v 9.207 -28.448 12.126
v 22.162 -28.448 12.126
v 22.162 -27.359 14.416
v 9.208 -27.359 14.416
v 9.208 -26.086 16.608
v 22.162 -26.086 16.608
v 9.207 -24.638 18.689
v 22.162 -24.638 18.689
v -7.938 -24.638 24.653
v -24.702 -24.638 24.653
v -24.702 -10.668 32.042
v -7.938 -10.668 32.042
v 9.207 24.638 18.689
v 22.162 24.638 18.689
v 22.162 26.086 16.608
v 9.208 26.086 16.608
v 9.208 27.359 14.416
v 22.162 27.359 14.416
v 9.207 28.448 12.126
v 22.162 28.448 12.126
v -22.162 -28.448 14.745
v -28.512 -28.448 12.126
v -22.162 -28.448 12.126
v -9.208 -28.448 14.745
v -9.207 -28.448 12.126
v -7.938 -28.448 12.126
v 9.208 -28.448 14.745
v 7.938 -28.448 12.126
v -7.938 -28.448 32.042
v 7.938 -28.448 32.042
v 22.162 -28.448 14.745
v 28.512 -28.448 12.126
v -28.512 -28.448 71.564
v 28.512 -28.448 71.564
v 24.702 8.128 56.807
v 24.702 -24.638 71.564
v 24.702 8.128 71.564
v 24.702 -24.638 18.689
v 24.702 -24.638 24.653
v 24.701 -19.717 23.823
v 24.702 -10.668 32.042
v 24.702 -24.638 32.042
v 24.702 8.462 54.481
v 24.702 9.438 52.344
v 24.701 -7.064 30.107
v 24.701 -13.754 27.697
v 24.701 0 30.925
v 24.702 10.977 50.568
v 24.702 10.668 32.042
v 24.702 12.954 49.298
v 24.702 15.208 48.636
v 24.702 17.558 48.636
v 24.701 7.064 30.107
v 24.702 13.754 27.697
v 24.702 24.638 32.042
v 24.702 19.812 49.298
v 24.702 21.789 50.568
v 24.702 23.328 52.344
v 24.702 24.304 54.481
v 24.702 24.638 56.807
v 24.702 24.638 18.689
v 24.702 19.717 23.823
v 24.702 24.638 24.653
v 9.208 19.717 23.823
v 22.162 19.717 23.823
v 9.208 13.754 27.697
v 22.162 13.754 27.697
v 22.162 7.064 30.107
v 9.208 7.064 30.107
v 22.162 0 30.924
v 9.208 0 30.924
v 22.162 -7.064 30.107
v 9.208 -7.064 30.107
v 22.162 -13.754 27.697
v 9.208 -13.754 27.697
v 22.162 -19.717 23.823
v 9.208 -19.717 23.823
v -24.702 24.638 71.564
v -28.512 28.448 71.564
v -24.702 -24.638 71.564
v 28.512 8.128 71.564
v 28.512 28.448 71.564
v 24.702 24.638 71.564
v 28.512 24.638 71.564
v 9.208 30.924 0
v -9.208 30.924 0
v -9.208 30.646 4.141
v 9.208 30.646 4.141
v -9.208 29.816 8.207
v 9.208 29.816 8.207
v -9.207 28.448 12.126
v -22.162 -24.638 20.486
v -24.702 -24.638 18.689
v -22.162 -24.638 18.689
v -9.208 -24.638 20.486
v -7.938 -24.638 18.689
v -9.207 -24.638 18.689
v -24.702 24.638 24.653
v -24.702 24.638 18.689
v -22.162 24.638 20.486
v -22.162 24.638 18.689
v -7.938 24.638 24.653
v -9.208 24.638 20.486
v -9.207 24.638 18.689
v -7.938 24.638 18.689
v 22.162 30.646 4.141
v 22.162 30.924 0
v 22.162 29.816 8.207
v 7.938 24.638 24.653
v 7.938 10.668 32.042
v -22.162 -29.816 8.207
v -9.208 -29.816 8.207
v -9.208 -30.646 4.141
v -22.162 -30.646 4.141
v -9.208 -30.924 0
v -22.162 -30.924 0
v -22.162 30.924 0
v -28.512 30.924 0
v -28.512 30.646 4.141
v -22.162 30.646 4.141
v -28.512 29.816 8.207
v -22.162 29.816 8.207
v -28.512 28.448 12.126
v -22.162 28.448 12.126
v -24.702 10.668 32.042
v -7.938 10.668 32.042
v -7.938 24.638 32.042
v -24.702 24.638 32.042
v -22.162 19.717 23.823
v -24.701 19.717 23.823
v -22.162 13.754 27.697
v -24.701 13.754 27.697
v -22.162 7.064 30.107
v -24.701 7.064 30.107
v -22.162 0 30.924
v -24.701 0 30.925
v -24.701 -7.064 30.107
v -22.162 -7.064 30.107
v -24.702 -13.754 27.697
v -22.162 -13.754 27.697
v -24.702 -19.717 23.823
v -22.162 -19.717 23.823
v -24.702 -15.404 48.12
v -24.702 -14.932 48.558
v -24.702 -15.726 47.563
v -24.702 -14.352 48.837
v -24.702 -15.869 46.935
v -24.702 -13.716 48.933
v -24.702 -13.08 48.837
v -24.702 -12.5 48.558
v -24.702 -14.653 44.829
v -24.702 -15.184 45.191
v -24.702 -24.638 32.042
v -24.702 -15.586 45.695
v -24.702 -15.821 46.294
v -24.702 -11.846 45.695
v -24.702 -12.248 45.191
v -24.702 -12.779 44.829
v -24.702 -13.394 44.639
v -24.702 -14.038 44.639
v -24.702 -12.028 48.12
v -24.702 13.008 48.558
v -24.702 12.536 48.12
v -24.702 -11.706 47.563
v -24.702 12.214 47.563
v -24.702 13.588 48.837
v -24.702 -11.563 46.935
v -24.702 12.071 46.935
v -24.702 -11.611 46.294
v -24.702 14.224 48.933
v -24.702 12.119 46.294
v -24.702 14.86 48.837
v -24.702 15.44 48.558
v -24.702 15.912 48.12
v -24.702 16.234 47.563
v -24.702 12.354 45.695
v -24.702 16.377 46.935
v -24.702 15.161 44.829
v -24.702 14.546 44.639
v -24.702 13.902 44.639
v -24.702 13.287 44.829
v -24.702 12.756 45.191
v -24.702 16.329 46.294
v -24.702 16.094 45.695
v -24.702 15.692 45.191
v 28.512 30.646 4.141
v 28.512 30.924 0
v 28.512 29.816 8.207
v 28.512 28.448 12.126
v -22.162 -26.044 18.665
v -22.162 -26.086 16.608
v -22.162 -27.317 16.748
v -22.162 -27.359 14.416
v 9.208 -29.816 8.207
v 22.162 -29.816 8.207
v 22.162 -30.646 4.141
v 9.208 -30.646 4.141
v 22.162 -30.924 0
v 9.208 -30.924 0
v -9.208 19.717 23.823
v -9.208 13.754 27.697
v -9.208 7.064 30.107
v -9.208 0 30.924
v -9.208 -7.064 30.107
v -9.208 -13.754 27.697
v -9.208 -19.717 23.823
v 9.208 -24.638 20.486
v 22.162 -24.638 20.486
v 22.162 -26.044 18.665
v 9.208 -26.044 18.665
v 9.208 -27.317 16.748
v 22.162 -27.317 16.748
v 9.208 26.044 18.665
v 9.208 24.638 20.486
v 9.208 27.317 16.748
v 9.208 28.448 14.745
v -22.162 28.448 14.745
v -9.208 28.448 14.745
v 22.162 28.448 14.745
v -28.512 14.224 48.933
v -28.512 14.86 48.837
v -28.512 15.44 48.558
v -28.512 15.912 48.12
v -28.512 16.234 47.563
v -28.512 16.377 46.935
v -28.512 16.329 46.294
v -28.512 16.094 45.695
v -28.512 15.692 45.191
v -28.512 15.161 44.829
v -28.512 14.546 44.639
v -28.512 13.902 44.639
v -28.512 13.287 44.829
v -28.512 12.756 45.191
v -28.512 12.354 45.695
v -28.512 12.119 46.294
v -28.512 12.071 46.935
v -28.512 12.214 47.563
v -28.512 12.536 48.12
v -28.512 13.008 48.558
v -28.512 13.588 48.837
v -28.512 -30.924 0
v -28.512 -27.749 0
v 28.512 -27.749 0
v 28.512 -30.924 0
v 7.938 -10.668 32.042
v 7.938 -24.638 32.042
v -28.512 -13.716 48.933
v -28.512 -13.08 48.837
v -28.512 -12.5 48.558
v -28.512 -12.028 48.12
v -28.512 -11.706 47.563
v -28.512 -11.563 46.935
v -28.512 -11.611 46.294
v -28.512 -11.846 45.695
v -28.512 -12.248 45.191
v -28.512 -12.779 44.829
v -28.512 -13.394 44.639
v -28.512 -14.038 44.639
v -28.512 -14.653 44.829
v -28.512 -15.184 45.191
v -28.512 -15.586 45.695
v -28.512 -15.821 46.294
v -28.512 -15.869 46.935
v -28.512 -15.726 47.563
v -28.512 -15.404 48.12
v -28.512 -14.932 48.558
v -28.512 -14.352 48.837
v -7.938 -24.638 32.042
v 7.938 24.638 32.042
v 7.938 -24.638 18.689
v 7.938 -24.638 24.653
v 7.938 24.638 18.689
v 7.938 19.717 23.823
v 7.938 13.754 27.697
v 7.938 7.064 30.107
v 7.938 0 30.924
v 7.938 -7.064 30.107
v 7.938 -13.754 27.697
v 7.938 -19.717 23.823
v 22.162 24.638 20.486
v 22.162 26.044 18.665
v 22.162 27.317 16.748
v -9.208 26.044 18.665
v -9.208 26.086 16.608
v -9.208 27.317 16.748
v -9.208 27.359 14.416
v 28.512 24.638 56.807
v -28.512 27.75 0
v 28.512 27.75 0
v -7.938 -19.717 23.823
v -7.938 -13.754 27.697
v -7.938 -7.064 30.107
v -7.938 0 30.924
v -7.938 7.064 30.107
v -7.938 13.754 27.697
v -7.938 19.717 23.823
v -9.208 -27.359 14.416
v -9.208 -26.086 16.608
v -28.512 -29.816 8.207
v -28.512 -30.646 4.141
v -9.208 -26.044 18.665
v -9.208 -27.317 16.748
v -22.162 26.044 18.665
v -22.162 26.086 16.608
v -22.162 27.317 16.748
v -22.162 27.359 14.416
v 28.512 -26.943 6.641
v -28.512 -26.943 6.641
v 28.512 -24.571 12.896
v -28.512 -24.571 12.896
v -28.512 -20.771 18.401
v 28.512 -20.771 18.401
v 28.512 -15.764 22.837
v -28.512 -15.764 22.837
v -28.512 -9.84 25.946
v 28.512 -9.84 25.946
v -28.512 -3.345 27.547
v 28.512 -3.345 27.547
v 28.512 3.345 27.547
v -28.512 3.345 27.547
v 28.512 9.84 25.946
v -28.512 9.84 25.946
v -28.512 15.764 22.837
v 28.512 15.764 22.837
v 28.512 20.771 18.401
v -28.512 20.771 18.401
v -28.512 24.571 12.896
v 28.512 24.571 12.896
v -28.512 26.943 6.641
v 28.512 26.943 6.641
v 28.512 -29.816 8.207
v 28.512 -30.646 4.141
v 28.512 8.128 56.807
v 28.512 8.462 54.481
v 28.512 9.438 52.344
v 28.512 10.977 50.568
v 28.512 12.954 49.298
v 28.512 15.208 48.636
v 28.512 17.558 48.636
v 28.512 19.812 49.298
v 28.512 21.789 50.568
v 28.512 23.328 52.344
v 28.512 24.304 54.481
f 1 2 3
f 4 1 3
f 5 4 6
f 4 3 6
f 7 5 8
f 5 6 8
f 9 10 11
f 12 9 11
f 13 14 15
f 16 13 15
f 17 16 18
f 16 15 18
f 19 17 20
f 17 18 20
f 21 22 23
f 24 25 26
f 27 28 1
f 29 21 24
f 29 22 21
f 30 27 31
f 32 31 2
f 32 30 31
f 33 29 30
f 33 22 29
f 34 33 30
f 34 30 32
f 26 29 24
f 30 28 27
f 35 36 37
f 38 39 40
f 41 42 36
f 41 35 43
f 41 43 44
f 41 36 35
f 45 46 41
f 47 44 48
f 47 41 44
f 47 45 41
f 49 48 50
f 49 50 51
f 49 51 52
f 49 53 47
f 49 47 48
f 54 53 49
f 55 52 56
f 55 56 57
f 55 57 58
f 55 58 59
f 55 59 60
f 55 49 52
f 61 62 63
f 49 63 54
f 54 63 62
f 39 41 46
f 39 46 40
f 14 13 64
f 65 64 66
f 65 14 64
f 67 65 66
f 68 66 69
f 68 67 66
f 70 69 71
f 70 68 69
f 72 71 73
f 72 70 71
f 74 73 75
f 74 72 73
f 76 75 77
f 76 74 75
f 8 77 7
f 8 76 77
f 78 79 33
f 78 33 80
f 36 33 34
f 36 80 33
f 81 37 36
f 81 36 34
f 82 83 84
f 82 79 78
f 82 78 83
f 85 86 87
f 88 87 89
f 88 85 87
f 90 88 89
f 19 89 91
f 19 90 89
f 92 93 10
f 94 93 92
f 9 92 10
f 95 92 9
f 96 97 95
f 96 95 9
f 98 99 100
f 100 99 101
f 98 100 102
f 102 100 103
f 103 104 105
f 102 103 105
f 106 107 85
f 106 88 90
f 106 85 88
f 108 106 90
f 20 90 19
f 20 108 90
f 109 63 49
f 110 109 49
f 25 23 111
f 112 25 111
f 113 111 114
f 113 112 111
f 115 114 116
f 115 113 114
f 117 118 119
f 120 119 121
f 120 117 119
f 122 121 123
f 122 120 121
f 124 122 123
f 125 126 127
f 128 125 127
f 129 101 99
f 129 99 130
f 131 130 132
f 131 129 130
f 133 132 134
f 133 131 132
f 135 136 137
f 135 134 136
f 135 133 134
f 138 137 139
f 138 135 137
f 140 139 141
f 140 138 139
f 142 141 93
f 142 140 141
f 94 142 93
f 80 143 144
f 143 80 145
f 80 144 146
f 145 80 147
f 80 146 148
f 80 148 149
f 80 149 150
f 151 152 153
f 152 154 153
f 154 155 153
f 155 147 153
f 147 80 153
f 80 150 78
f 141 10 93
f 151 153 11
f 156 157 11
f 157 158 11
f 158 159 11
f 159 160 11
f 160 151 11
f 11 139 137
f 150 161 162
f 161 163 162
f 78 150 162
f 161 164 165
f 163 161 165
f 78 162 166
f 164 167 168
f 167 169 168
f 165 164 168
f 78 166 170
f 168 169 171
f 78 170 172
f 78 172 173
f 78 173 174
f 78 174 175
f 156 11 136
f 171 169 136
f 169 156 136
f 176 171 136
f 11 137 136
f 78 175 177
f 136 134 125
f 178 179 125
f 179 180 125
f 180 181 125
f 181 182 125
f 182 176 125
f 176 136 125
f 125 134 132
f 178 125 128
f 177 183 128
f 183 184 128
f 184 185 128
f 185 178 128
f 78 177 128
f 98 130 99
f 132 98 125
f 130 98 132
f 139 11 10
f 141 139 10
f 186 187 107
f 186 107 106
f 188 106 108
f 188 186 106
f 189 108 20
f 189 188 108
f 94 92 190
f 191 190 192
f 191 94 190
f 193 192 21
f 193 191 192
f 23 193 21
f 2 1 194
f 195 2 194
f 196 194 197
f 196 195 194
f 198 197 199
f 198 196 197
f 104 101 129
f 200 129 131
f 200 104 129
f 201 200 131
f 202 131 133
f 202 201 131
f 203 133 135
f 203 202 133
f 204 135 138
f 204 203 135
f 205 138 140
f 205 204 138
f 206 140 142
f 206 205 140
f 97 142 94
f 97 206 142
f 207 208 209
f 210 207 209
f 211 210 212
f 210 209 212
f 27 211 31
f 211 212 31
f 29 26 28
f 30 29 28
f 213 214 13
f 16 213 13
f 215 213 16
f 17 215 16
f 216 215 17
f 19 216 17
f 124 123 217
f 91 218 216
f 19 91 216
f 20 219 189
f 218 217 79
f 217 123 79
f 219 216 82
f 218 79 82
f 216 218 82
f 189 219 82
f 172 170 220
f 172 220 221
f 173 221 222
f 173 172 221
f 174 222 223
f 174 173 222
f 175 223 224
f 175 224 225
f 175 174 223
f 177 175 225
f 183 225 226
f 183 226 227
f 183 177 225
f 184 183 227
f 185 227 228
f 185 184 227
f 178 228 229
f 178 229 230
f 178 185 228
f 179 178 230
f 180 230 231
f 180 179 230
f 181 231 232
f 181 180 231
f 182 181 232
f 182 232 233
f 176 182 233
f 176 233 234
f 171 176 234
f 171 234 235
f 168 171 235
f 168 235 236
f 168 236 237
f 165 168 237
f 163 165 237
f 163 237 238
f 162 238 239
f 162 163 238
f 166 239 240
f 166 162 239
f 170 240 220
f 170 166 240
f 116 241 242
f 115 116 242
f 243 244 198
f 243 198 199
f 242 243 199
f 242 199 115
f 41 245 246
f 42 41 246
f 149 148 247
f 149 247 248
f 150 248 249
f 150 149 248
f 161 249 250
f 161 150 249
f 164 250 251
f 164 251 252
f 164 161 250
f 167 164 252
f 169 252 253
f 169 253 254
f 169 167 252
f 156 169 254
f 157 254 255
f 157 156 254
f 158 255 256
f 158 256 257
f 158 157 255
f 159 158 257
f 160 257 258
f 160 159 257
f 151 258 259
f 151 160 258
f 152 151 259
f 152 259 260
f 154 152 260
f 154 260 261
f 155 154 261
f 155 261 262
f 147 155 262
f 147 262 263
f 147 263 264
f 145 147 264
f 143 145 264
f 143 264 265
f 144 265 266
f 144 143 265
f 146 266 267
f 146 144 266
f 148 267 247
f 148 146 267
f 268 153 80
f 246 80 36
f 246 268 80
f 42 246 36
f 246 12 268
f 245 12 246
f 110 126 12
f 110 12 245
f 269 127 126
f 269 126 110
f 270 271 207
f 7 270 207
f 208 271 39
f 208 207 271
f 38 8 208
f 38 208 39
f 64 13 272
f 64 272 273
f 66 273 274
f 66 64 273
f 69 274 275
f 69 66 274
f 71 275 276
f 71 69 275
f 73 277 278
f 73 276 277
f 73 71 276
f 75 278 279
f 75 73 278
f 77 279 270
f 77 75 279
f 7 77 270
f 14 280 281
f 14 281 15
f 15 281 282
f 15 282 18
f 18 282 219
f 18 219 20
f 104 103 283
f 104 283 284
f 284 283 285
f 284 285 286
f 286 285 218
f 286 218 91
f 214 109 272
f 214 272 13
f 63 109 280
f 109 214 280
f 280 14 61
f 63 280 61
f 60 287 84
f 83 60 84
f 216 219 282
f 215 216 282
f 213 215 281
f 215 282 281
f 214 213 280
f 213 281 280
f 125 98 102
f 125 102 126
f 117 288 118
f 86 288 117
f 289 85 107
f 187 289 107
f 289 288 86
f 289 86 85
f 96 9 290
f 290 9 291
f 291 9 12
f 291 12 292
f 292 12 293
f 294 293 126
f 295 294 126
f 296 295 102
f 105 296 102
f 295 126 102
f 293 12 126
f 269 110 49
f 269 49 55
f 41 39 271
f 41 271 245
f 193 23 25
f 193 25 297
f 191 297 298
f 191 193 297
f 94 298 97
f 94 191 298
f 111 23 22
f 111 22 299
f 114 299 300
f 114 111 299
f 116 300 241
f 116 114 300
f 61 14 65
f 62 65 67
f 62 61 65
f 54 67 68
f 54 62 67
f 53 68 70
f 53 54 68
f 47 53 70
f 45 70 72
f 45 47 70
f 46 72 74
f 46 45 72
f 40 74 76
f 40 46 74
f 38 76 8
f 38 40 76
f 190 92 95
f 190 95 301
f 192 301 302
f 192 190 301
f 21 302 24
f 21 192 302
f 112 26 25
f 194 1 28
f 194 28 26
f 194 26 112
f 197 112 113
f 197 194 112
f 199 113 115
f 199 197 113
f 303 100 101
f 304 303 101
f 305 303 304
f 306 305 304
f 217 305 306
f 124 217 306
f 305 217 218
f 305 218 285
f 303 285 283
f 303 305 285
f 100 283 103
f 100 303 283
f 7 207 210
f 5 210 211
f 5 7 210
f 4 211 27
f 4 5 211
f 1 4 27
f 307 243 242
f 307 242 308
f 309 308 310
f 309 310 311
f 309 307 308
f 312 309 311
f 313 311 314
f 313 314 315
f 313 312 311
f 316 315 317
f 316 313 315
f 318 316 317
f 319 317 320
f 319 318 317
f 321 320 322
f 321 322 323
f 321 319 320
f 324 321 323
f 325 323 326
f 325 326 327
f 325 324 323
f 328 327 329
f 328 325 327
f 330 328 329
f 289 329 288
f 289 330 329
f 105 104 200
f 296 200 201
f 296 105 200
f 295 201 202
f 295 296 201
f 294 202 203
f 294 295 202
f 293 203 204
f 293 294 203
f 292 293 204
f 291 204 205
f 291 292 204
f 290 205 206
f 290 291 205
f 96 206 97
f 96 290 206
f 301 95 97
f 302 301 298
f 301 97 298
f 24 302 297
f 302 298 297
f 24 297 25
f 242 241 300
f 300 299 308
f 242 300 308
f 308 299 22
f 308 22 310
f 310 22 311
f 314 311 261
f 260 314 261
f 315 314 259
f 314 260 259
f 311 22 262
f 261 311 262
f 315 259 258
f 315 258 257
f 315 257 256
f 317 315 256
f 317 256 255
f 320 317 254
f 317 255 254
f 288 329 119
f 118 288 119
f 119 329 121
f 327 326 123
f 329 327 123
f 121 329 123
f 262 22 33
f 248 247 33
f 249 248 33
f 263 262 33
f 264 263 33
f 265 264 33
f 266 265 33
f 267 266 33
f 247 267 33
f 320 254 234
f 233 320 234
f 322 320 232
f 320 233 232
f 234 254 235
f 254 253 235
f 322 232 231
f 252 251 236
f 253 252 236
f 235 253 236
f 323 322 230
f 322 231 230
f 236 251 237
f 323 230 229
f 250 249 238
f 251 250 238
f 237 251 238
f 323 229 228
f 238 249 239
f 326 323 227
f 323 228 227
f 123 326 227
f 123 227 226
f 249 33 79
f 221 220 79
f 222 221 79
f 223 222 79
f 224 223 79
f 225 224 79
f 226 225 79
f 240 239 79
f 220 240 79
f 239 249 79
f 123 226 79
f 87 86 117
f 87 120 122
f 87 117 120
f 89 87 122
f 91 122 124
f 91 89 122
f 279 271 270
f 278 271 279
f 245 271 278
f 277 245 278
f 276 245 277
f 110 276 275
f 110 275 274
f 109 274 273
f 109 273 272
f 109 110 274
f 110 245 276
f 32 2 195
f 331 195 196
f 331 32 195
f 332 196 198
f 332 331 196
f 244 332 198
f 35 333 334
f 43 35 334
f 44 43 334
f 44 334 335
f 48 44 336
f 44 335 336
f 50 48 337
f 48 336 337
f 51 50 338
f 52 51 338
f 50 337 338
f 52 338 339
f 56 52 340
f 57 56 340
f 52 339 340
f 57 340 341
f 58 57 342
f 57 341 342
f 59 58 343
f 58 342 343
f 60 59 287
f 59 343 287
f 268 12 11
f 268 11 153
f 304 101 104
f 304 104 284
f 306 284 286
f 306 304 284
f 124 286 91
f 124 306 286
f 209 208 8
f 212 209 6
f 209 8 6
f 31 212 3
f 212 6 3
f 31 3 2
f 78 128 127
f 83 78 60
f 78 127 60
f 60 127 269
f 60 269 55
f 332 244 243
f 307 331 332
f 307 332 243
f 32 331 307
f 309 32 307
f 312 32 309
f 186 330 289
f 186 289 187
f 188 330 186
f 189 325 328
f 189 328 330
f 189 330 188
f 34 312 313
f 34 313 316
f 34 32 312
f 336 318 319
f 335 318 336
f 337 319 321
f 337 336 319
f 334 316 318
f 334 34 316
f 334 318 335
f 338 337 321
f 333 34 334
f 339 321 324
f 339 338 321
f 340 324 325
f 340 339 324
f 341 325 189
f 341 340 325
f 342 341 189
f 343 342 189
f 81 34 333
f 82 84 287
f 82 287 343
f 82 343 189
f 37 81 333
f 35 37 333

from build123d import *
from build123d.topology import SkipClean

# Parameters (mm, degrees)
BOSS_EXTRUDE1_DEPTH                  = 28.5115
SKETCH5_W                            = 57.023
SKETCH5_H                            = 56.896
SKETCH5_W_2                          = 49.403
SKETCH5_H_2                          = 49.276
BOSS_EXTRUDE2_DEPTH                  = 40.64
BOSS_EXTRUDE2_DIRECTION_2_REACH      = 54.207
BOSS_EXTRUDE2_DIRECTION_2_END_RADIUS = 30.9245
CUT_EXTRUDE1_START                   = -12.954
CUT_EXTRUDE1_DEPTH                   = 12.954
CUT_EXTRUDE2_START                   = -12.954
CUT_EXTRUDE2_DEPTH                   = 12.954
CUT_EXTRUDE3_DEPTH                   = 3.81
BOSS_EXTRUDE3_REACH                  = 59.717
BOSS_EXTRUDE3_END_RADIUS             = 30.9245
SKETCH11_W                           = 15.875
SKETCH11_H                           = 53.086
BOSS_EXTRUDE5_DEPTH                  = 16.764
BOSS_EXTRUDE6_DEPTH                  = 16.764
CUT_EXTRUDE4_START                   = -3.81
CUT_EXTRUDE4_OUTLINE_R               = 2.159
CUT_EXTRUDE4_DEPTH                   = 3.81


# Read off the part's stored shape, not the designer's step: Cut-Extrude4
with BuildPart() as part:
    # Sketch2 → Boss-Extrude1 (new, symmetric)
    with BuildSketch(Plane(origin=(0, 0, 0), x_dir=(0, 0, -1), z_dir=(1, 0, 0))):
        with BuildLine():
            Line((0, -30.9245), (0, -27.7495))
            ThreePointArc((0, -27.7495), (-27.7495, 0), (0, 27.7495))
            Line((0, 27.7495), (0, 30.9245))
            ThreePointArc((0, 30.9245), (-30.9245, 0), (0, -30.9245))
        make_face()
    extrude(amount=BOSS_EXTRUDE1_DEPTH, both=True)

    # Sketch5 → Boss-Extrude2 (add)
    with BuildSketch(Plane.XY.offset(30.9245)):
        Rectangle(SKETCH5_W, SKETCH5_H)
        Rectangle(SKETCH5_W_2, SKETCH5_H_2, mode=Mode.SUBTRACT)
    extrude(amount=BOSS_EXTRUDE2_DEPTH)

    # Boss-Extrude2 direction 2: up to this cylinder (the profile starts outside it)
    boss_extrude2_direction_2_end = Plane(origin=(0, 0, 0), z_dir=(-1, 0, 0)) * Cylinder(BOSS_EXTRUDE2_DIRECTION_2_END_RADIUS, 171.263, mode=Mode.PRIVATE)
    # Sketch5 → Boss-Extrude2 direction 2 (add, up to the surface)
    with BuildSketch(Plane.XY.offset(30.9245), mode=Mode.PRIVATE) as boss_extrude2_direction_2_sk1:
        Rectangle(SKETCH5_W, SKETCH5_H)
        Rectangle(SKETCH5_W_2, SKETCH5_H_2, mode=Mode.SUBTRACT)
    boss_extrude2_direction_2_tool1 = extrude(boss_extrude2_direction_2_sk1.sketch, amount=-BOSS_EXTRUDE2_DIRECTION_2_REACH, mode=Mode.PRIVATE) - boss_extrude2_direction_2_end
    add(boss_extrude2_direction_2_tool1.solids().sort_by_distance((0, 27.642471, 30.9245))[0])
    add(boss_extrude2_direction_2_tool1.solids().sort_by_distance((0, 27.642471, 30.9245))[1])

    # Sketch7 → Cut-Extrude1 (cut)
    with SkipClean():  # the faces are left unmerged after this step: merging them gives an invalid solid
        with BuildSketch(Plane.ZY.offset(-9.2075).offset(CUT_EXTRUDE1_START)):
            with BuildLine():
                Line((0, 30.9245), (0, 32.0421))
                ThreePointArc((0, 32.0421), (32.0421, 0), (0, -32.0421))
                Line((0, -32.0421), (0, -30.9245))
                ThreePointArc((0, -30.9245), (30.9245, 0), (0, 30.9245))
            make_face()
        extrude(amount=CUT_EXTRUDE1_DEPTH, mode=Mode.SUBTRACT)

    # Sketch8 → Cut-Extrude2 (cut)
    with SkipClean():  # the faces are left unmerged after this step: merging them gives an invalid solid
        with BuildSketch(Plane(origin=(-9.2075, 0, 0), x_dir=(0, 0, -1), z_dir=(1, 0, 0)).offset(CUT_EXTRUDE2_START)):
            with BuildLine():
                Line((0, 30.9245), (0, 32.0421))
                ThreePointArc((0, 32.0421), (-32.0421, 0), (0, -32.0421))
                Line((0, -32.0421), (0, -30.9245))
                ThreePointArc((0, -30.9245), (-30.9245, 0), (0, 30.9245))
            make_face()
        extrude(amount=CUT_EXTRUDE2_DEPTH, mode=Mode.SUBTRACT)

    # Sketch10 → Cut-Extrude3 (cut)
    with SkipClean():  # the faces are left unmerged after this step: merging them gives an invalid solid
        with BuildSketch(Plane(origin=(28.5115, 0, 0), x_dir=(0, 0, -1), z_dir=(1, 0, 0))):
            with BuildLine():
                Line((-56.8071, 24.638), (-71.5645, 24.638))
                Line((-71.5645, 24.638), (-71.5645, 8.128))
                Line((-71.5645, 8.128), (-56.8071, 8.128))
                ThreePointArc((-56.8071, 8.128), (-48.5521, 16.383), (-56.8071, 24.638))
            make_face()
        extrude(amount=-CUT_EXTRUDE3_DEPTH, mode=Mode.SUBTRACT)

    # Boss-Extrude3: up to this cylinder (the profile starts outside it)
    with SkipClean():  # the faces are left unmerged after this step: merging them gives an invalid solid
        boss_extrude3_end = Plane(origin=(0, 0, 0), z_dir=(-1, 0, 0)) * Cylinder(BOSS_EXTRUDE3_END_RADIUS, 182.283, mode=Mode.PRIVATE)
        # Sketch11 → Boss-Extrude3 (add, up to the surface)
        with BuildSketch(Plane.XY.offset(32.0421), mode=Mode.PRIVATE) as boss_extrude3_sk1:
            with Locations((0, -1.905)):
                Rectangle(SKETCH11_W, SKETCH11_H)
        boss_extrude3_tool1 = extrude(boss_extrude3_sk1.sketch, amount=-BOSS_EXTRUDE3_REACH, mode=Mode.PRIVATE) - boss_extrude3_end
        add(boss_extrude3_tool1.solids().sort_by_distance((0, -1.905, 32.0421))[0])

    # Sketch15 → Boss-Extrude5 (add)
    with SkipClean():  # the faces are left unmerged after this step: merging them gives an invalid solid
        with BuildSketch(Plane.ZY.offset(7.9375)):
            Polygon((32.0421, -24.638), (24.653467357, -24.638), (32.0421, -10.668), align=None)
            Polygon((24.653467357, 24.638), (32.0421, 10.668), (32.0421, 24.638), align=None)
        extrude(amount=BOSS_EXTRUDE5_DEPTH)

    # Sketch16 → Boss-Extrude6 (add)
    with SkipClean():  # the faces are left unmerged after this step: merging them gives an invalid solid
        with BuildSketch(Plane(origin=(7.9375, 0, 0), x_dir=(0, 0, -1), z_dir=(1, 0, 0))):
            Polygon((-32.0421, -24.638), (-24.653467357, -24.638), (-32.0421, -10.668), align=None)
            Polygon((-24.653467357, 24.638), (-32.0421, 10.668), (-32.0421, 24.638), align=None)
        extrude(amount=BOSS_EXTRUDE6_DEPTH)

    # Cut-Extrude4 outline → Cut-Extrude4 (cut)
    with SkipClean():  # the faces are left unmerged after this step: merging them gives an invalid solid
        with BuildSketch(Plane.ZY.offset(28.5115).offset(CUT_EXTRUDE4_START)):
            with Locations((46.7741, -13.716)):
                Circle(CUT_EXTRUDE4_OUTLINE_R)
            with Locations((46.7741, 14.224)):
                Circle(CUT_EXTRUDE4_OUTLINE_R)
        extrude(amount=CUT_EXTRUDE4_DEPTH, mode=Mode.SUBTRACT)


solid = part.part
